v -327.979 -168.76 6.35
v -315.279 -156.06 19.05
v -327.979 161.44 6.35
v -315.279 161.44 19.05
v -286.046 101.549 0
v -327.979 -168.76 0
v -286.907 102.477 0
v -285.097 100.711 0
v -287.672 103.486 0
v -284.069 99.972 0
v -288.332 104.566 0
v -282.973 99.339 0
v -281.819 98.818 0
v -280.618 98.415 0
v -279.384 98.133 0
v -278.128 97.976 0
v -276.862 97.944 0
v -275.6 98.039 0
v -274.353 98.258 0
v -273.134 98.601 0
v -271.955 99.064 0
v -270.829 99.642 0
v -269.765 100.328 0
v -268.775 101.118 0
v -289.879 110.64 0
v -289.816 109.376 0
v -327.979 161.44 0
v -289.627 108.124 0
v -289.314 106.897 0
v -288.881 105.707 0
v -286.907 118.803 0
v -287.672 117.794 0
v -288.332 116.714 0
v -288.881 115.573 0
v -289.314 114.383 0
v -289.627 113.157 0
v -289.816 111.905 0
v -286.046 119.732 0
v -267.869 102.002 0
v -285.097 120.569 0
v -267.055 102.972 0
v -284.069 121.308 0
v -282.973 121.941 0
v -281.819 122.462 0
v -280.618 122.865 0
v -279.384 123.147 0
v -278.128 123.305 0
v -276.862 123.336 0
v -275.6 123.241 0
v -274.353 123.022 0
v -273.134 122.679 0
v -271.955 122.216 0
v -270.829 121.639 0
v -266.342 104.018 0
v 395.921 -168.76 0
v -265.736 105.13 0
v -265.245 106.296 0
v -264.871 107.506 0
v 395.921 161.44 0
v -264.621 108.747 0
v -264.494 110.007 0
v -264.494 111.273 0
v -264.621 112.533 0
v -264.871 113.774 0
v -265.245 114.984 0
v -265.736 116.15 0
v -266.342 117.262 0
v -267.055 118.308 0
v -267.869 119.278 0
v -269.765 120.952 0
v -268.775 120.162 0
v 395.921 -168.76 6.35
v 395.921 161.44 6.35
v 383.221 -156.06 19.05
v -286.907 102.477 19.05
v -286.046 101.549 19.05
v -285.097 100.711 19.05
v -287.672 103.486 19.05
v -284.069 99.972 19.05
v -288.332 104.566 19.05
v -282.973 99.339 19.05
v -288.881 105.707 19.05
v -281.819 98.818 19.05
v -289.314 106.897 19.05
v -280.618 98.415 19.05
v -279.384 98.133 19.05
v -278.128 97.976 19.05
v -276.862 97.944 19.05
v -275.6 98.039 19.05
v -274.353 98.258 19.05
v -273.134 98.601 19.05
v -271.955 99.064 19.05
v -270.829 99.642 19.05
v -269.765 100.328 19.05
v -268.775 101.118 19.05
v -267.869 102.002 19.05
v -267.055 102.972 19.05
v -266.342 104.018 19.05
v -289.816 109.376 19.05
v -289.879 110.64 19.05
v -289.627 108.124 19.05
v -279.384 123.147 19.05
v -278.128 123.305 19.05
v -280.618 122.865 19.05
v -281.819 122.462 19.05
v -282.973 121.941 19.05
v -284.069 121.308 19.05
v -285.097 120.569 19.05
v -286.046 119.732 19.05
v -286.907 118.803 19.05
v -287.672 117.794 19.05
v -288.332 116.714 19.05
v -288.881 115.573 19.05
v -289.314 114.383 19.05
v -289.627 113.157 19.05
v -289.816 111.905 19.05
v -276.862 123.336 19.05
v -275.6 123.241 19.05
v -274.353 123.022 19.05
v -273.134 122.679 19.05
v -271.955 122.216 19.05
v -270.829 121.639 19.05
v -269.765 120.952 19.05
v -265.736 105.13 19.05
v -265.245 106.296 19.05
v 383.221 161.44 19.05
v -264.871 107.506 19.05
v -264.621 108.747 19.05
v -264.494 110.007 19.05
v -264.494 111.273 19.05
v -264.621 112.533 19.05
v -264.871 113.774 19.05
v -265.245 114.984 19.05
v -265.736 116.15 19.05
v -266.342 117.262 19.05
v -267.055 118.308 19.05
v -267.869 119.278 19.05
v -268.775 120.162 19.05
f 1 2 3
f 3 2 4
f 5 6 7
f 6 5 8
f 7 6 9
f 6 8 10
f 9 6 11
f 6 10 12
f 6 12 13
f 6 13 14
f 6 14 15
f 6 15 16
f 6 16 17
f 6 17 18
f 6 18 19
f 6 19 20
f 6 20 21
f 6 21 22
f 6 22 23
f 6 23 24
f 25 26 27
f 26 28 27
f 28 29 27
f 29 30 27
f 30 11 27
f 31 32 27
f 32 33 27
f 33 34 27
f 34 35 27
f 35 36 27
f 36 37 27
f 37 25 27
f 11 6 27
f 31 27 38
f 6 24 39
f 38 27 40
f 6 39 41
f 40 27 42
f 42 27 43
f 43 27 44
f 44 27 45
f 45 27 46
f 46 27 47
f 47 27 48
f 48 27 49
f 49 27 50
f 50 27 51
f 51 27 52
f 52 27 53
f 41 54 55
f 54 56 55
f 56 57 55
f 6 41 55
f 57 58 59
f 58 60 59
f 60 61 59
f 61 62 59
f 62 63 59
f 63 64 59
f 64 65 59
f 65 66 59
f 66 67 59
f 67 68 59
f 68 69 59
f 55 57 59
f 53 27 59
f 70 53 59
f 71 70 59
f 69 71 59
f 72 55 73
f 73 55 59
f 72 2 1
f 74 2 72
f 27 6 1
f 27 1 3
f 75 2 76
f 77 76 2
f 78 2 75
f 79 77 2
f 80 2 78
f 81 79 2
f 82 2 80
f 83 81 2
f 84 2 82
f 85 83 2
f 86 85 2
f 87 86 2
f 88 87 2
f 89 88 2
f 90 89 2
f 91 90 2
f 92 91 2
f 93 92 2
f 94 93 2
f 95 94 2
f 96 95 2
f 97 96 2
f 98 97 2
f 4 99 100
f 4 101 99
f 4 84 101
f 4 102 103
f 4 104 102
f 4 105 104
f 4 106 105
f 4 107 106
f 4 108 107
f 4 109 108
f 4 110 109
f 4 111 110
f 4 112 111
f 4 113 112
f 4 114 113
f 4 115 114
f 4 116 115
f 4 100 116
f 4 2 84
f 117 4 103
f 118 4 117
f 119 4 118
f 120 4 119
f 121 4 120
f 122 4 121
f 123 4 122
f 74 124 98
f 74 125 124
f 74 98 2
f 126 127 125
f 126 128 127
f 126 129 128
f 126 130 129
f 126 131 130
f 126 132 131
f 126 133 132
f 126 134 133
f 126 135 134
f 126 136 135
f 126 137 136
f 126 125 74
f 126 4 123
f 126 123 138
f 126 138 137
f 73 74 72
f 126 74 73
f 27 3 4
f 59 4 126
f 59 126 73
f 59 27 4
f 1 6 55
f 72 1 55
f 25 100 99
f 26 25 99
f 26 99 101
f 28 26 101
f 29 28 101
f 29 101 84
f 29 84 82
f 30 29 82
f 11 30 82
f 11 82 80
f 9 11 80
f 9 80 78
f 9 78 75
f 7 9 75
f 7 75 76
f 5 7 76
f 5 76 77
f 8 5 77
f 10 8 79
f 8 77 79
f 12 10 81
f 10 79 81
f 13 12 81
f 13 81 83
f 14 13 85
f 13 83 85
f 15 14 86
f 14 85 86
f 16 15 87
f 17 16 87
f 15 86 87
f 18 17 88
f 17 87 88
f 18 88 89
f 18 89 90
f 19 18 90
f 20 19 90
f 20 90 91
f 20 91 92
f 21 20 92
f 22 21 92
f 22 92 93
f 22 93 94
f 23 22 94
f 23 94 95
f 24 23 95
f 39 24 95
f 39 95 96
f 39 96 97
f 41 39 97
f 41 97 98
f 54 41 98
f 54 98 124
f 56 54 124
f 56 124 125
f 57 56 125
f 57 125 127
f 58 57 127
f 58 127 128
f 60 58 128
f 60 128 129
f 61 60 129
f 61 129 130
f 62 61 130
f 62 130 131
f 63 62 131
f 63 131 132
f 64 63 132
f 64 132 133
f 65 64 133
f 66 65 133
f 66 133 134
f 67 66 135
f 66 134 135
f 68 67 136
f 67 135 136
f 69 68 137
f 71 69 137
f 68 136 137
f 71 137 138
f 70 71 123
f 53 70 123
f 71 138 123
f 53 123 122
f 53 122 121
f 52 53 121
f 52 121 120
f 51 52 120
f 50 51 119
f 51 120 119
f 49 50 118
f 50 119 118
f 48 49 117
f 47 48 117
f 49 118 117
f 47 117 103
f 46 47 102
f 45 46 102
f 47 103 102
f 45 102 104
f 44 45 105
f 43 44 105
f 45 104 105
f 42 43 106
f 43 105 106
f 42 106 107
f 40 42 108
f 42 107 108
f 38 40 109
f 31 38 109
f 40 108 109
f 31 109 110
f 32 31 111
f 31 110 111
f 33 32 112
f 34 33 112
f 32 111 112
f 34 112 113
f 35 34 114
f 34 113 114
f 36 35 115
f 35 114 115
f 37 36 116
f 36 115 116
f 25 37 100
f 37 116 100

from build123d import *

# Parameters (mm, degrees)
F0_W     = 723.9
F0_H     = 330.2
F1_DEPTH = 19.05
F2_SIZE  = 12.7
F3_D     = 25.4


with BuildPart() as f1:
    # F0 (on Top) → F1 (new body)
    with BuildSketch(Plane.XY):
        with Locations((33.9713070929, -3.6599552712)):
            Rectangle(F0_W, F0_H)
    extrude(amount=F1_DEPTH)

    # F2
    f2_edges = [f1.edges().sort_by_distance(p)[0] for p in [
        (395.921307, -3.659955, 19.05),
        (-327.978693, -3.659955, 19.05),
        (33.971307, -168.759955, 19.05),
    ]]
    chamfer(f2_edges, length=F2_SIZE)

    # F3 (through all)
    with Locations(Plane(origin=(0, 0, 0), x_dir=(1, 0, 0), z_dir=(0, 0, -1))):
        with Locations((-277.1786929071, -110.6400447288)):
            Hole(F3_D / 2)


solid = f1.part
